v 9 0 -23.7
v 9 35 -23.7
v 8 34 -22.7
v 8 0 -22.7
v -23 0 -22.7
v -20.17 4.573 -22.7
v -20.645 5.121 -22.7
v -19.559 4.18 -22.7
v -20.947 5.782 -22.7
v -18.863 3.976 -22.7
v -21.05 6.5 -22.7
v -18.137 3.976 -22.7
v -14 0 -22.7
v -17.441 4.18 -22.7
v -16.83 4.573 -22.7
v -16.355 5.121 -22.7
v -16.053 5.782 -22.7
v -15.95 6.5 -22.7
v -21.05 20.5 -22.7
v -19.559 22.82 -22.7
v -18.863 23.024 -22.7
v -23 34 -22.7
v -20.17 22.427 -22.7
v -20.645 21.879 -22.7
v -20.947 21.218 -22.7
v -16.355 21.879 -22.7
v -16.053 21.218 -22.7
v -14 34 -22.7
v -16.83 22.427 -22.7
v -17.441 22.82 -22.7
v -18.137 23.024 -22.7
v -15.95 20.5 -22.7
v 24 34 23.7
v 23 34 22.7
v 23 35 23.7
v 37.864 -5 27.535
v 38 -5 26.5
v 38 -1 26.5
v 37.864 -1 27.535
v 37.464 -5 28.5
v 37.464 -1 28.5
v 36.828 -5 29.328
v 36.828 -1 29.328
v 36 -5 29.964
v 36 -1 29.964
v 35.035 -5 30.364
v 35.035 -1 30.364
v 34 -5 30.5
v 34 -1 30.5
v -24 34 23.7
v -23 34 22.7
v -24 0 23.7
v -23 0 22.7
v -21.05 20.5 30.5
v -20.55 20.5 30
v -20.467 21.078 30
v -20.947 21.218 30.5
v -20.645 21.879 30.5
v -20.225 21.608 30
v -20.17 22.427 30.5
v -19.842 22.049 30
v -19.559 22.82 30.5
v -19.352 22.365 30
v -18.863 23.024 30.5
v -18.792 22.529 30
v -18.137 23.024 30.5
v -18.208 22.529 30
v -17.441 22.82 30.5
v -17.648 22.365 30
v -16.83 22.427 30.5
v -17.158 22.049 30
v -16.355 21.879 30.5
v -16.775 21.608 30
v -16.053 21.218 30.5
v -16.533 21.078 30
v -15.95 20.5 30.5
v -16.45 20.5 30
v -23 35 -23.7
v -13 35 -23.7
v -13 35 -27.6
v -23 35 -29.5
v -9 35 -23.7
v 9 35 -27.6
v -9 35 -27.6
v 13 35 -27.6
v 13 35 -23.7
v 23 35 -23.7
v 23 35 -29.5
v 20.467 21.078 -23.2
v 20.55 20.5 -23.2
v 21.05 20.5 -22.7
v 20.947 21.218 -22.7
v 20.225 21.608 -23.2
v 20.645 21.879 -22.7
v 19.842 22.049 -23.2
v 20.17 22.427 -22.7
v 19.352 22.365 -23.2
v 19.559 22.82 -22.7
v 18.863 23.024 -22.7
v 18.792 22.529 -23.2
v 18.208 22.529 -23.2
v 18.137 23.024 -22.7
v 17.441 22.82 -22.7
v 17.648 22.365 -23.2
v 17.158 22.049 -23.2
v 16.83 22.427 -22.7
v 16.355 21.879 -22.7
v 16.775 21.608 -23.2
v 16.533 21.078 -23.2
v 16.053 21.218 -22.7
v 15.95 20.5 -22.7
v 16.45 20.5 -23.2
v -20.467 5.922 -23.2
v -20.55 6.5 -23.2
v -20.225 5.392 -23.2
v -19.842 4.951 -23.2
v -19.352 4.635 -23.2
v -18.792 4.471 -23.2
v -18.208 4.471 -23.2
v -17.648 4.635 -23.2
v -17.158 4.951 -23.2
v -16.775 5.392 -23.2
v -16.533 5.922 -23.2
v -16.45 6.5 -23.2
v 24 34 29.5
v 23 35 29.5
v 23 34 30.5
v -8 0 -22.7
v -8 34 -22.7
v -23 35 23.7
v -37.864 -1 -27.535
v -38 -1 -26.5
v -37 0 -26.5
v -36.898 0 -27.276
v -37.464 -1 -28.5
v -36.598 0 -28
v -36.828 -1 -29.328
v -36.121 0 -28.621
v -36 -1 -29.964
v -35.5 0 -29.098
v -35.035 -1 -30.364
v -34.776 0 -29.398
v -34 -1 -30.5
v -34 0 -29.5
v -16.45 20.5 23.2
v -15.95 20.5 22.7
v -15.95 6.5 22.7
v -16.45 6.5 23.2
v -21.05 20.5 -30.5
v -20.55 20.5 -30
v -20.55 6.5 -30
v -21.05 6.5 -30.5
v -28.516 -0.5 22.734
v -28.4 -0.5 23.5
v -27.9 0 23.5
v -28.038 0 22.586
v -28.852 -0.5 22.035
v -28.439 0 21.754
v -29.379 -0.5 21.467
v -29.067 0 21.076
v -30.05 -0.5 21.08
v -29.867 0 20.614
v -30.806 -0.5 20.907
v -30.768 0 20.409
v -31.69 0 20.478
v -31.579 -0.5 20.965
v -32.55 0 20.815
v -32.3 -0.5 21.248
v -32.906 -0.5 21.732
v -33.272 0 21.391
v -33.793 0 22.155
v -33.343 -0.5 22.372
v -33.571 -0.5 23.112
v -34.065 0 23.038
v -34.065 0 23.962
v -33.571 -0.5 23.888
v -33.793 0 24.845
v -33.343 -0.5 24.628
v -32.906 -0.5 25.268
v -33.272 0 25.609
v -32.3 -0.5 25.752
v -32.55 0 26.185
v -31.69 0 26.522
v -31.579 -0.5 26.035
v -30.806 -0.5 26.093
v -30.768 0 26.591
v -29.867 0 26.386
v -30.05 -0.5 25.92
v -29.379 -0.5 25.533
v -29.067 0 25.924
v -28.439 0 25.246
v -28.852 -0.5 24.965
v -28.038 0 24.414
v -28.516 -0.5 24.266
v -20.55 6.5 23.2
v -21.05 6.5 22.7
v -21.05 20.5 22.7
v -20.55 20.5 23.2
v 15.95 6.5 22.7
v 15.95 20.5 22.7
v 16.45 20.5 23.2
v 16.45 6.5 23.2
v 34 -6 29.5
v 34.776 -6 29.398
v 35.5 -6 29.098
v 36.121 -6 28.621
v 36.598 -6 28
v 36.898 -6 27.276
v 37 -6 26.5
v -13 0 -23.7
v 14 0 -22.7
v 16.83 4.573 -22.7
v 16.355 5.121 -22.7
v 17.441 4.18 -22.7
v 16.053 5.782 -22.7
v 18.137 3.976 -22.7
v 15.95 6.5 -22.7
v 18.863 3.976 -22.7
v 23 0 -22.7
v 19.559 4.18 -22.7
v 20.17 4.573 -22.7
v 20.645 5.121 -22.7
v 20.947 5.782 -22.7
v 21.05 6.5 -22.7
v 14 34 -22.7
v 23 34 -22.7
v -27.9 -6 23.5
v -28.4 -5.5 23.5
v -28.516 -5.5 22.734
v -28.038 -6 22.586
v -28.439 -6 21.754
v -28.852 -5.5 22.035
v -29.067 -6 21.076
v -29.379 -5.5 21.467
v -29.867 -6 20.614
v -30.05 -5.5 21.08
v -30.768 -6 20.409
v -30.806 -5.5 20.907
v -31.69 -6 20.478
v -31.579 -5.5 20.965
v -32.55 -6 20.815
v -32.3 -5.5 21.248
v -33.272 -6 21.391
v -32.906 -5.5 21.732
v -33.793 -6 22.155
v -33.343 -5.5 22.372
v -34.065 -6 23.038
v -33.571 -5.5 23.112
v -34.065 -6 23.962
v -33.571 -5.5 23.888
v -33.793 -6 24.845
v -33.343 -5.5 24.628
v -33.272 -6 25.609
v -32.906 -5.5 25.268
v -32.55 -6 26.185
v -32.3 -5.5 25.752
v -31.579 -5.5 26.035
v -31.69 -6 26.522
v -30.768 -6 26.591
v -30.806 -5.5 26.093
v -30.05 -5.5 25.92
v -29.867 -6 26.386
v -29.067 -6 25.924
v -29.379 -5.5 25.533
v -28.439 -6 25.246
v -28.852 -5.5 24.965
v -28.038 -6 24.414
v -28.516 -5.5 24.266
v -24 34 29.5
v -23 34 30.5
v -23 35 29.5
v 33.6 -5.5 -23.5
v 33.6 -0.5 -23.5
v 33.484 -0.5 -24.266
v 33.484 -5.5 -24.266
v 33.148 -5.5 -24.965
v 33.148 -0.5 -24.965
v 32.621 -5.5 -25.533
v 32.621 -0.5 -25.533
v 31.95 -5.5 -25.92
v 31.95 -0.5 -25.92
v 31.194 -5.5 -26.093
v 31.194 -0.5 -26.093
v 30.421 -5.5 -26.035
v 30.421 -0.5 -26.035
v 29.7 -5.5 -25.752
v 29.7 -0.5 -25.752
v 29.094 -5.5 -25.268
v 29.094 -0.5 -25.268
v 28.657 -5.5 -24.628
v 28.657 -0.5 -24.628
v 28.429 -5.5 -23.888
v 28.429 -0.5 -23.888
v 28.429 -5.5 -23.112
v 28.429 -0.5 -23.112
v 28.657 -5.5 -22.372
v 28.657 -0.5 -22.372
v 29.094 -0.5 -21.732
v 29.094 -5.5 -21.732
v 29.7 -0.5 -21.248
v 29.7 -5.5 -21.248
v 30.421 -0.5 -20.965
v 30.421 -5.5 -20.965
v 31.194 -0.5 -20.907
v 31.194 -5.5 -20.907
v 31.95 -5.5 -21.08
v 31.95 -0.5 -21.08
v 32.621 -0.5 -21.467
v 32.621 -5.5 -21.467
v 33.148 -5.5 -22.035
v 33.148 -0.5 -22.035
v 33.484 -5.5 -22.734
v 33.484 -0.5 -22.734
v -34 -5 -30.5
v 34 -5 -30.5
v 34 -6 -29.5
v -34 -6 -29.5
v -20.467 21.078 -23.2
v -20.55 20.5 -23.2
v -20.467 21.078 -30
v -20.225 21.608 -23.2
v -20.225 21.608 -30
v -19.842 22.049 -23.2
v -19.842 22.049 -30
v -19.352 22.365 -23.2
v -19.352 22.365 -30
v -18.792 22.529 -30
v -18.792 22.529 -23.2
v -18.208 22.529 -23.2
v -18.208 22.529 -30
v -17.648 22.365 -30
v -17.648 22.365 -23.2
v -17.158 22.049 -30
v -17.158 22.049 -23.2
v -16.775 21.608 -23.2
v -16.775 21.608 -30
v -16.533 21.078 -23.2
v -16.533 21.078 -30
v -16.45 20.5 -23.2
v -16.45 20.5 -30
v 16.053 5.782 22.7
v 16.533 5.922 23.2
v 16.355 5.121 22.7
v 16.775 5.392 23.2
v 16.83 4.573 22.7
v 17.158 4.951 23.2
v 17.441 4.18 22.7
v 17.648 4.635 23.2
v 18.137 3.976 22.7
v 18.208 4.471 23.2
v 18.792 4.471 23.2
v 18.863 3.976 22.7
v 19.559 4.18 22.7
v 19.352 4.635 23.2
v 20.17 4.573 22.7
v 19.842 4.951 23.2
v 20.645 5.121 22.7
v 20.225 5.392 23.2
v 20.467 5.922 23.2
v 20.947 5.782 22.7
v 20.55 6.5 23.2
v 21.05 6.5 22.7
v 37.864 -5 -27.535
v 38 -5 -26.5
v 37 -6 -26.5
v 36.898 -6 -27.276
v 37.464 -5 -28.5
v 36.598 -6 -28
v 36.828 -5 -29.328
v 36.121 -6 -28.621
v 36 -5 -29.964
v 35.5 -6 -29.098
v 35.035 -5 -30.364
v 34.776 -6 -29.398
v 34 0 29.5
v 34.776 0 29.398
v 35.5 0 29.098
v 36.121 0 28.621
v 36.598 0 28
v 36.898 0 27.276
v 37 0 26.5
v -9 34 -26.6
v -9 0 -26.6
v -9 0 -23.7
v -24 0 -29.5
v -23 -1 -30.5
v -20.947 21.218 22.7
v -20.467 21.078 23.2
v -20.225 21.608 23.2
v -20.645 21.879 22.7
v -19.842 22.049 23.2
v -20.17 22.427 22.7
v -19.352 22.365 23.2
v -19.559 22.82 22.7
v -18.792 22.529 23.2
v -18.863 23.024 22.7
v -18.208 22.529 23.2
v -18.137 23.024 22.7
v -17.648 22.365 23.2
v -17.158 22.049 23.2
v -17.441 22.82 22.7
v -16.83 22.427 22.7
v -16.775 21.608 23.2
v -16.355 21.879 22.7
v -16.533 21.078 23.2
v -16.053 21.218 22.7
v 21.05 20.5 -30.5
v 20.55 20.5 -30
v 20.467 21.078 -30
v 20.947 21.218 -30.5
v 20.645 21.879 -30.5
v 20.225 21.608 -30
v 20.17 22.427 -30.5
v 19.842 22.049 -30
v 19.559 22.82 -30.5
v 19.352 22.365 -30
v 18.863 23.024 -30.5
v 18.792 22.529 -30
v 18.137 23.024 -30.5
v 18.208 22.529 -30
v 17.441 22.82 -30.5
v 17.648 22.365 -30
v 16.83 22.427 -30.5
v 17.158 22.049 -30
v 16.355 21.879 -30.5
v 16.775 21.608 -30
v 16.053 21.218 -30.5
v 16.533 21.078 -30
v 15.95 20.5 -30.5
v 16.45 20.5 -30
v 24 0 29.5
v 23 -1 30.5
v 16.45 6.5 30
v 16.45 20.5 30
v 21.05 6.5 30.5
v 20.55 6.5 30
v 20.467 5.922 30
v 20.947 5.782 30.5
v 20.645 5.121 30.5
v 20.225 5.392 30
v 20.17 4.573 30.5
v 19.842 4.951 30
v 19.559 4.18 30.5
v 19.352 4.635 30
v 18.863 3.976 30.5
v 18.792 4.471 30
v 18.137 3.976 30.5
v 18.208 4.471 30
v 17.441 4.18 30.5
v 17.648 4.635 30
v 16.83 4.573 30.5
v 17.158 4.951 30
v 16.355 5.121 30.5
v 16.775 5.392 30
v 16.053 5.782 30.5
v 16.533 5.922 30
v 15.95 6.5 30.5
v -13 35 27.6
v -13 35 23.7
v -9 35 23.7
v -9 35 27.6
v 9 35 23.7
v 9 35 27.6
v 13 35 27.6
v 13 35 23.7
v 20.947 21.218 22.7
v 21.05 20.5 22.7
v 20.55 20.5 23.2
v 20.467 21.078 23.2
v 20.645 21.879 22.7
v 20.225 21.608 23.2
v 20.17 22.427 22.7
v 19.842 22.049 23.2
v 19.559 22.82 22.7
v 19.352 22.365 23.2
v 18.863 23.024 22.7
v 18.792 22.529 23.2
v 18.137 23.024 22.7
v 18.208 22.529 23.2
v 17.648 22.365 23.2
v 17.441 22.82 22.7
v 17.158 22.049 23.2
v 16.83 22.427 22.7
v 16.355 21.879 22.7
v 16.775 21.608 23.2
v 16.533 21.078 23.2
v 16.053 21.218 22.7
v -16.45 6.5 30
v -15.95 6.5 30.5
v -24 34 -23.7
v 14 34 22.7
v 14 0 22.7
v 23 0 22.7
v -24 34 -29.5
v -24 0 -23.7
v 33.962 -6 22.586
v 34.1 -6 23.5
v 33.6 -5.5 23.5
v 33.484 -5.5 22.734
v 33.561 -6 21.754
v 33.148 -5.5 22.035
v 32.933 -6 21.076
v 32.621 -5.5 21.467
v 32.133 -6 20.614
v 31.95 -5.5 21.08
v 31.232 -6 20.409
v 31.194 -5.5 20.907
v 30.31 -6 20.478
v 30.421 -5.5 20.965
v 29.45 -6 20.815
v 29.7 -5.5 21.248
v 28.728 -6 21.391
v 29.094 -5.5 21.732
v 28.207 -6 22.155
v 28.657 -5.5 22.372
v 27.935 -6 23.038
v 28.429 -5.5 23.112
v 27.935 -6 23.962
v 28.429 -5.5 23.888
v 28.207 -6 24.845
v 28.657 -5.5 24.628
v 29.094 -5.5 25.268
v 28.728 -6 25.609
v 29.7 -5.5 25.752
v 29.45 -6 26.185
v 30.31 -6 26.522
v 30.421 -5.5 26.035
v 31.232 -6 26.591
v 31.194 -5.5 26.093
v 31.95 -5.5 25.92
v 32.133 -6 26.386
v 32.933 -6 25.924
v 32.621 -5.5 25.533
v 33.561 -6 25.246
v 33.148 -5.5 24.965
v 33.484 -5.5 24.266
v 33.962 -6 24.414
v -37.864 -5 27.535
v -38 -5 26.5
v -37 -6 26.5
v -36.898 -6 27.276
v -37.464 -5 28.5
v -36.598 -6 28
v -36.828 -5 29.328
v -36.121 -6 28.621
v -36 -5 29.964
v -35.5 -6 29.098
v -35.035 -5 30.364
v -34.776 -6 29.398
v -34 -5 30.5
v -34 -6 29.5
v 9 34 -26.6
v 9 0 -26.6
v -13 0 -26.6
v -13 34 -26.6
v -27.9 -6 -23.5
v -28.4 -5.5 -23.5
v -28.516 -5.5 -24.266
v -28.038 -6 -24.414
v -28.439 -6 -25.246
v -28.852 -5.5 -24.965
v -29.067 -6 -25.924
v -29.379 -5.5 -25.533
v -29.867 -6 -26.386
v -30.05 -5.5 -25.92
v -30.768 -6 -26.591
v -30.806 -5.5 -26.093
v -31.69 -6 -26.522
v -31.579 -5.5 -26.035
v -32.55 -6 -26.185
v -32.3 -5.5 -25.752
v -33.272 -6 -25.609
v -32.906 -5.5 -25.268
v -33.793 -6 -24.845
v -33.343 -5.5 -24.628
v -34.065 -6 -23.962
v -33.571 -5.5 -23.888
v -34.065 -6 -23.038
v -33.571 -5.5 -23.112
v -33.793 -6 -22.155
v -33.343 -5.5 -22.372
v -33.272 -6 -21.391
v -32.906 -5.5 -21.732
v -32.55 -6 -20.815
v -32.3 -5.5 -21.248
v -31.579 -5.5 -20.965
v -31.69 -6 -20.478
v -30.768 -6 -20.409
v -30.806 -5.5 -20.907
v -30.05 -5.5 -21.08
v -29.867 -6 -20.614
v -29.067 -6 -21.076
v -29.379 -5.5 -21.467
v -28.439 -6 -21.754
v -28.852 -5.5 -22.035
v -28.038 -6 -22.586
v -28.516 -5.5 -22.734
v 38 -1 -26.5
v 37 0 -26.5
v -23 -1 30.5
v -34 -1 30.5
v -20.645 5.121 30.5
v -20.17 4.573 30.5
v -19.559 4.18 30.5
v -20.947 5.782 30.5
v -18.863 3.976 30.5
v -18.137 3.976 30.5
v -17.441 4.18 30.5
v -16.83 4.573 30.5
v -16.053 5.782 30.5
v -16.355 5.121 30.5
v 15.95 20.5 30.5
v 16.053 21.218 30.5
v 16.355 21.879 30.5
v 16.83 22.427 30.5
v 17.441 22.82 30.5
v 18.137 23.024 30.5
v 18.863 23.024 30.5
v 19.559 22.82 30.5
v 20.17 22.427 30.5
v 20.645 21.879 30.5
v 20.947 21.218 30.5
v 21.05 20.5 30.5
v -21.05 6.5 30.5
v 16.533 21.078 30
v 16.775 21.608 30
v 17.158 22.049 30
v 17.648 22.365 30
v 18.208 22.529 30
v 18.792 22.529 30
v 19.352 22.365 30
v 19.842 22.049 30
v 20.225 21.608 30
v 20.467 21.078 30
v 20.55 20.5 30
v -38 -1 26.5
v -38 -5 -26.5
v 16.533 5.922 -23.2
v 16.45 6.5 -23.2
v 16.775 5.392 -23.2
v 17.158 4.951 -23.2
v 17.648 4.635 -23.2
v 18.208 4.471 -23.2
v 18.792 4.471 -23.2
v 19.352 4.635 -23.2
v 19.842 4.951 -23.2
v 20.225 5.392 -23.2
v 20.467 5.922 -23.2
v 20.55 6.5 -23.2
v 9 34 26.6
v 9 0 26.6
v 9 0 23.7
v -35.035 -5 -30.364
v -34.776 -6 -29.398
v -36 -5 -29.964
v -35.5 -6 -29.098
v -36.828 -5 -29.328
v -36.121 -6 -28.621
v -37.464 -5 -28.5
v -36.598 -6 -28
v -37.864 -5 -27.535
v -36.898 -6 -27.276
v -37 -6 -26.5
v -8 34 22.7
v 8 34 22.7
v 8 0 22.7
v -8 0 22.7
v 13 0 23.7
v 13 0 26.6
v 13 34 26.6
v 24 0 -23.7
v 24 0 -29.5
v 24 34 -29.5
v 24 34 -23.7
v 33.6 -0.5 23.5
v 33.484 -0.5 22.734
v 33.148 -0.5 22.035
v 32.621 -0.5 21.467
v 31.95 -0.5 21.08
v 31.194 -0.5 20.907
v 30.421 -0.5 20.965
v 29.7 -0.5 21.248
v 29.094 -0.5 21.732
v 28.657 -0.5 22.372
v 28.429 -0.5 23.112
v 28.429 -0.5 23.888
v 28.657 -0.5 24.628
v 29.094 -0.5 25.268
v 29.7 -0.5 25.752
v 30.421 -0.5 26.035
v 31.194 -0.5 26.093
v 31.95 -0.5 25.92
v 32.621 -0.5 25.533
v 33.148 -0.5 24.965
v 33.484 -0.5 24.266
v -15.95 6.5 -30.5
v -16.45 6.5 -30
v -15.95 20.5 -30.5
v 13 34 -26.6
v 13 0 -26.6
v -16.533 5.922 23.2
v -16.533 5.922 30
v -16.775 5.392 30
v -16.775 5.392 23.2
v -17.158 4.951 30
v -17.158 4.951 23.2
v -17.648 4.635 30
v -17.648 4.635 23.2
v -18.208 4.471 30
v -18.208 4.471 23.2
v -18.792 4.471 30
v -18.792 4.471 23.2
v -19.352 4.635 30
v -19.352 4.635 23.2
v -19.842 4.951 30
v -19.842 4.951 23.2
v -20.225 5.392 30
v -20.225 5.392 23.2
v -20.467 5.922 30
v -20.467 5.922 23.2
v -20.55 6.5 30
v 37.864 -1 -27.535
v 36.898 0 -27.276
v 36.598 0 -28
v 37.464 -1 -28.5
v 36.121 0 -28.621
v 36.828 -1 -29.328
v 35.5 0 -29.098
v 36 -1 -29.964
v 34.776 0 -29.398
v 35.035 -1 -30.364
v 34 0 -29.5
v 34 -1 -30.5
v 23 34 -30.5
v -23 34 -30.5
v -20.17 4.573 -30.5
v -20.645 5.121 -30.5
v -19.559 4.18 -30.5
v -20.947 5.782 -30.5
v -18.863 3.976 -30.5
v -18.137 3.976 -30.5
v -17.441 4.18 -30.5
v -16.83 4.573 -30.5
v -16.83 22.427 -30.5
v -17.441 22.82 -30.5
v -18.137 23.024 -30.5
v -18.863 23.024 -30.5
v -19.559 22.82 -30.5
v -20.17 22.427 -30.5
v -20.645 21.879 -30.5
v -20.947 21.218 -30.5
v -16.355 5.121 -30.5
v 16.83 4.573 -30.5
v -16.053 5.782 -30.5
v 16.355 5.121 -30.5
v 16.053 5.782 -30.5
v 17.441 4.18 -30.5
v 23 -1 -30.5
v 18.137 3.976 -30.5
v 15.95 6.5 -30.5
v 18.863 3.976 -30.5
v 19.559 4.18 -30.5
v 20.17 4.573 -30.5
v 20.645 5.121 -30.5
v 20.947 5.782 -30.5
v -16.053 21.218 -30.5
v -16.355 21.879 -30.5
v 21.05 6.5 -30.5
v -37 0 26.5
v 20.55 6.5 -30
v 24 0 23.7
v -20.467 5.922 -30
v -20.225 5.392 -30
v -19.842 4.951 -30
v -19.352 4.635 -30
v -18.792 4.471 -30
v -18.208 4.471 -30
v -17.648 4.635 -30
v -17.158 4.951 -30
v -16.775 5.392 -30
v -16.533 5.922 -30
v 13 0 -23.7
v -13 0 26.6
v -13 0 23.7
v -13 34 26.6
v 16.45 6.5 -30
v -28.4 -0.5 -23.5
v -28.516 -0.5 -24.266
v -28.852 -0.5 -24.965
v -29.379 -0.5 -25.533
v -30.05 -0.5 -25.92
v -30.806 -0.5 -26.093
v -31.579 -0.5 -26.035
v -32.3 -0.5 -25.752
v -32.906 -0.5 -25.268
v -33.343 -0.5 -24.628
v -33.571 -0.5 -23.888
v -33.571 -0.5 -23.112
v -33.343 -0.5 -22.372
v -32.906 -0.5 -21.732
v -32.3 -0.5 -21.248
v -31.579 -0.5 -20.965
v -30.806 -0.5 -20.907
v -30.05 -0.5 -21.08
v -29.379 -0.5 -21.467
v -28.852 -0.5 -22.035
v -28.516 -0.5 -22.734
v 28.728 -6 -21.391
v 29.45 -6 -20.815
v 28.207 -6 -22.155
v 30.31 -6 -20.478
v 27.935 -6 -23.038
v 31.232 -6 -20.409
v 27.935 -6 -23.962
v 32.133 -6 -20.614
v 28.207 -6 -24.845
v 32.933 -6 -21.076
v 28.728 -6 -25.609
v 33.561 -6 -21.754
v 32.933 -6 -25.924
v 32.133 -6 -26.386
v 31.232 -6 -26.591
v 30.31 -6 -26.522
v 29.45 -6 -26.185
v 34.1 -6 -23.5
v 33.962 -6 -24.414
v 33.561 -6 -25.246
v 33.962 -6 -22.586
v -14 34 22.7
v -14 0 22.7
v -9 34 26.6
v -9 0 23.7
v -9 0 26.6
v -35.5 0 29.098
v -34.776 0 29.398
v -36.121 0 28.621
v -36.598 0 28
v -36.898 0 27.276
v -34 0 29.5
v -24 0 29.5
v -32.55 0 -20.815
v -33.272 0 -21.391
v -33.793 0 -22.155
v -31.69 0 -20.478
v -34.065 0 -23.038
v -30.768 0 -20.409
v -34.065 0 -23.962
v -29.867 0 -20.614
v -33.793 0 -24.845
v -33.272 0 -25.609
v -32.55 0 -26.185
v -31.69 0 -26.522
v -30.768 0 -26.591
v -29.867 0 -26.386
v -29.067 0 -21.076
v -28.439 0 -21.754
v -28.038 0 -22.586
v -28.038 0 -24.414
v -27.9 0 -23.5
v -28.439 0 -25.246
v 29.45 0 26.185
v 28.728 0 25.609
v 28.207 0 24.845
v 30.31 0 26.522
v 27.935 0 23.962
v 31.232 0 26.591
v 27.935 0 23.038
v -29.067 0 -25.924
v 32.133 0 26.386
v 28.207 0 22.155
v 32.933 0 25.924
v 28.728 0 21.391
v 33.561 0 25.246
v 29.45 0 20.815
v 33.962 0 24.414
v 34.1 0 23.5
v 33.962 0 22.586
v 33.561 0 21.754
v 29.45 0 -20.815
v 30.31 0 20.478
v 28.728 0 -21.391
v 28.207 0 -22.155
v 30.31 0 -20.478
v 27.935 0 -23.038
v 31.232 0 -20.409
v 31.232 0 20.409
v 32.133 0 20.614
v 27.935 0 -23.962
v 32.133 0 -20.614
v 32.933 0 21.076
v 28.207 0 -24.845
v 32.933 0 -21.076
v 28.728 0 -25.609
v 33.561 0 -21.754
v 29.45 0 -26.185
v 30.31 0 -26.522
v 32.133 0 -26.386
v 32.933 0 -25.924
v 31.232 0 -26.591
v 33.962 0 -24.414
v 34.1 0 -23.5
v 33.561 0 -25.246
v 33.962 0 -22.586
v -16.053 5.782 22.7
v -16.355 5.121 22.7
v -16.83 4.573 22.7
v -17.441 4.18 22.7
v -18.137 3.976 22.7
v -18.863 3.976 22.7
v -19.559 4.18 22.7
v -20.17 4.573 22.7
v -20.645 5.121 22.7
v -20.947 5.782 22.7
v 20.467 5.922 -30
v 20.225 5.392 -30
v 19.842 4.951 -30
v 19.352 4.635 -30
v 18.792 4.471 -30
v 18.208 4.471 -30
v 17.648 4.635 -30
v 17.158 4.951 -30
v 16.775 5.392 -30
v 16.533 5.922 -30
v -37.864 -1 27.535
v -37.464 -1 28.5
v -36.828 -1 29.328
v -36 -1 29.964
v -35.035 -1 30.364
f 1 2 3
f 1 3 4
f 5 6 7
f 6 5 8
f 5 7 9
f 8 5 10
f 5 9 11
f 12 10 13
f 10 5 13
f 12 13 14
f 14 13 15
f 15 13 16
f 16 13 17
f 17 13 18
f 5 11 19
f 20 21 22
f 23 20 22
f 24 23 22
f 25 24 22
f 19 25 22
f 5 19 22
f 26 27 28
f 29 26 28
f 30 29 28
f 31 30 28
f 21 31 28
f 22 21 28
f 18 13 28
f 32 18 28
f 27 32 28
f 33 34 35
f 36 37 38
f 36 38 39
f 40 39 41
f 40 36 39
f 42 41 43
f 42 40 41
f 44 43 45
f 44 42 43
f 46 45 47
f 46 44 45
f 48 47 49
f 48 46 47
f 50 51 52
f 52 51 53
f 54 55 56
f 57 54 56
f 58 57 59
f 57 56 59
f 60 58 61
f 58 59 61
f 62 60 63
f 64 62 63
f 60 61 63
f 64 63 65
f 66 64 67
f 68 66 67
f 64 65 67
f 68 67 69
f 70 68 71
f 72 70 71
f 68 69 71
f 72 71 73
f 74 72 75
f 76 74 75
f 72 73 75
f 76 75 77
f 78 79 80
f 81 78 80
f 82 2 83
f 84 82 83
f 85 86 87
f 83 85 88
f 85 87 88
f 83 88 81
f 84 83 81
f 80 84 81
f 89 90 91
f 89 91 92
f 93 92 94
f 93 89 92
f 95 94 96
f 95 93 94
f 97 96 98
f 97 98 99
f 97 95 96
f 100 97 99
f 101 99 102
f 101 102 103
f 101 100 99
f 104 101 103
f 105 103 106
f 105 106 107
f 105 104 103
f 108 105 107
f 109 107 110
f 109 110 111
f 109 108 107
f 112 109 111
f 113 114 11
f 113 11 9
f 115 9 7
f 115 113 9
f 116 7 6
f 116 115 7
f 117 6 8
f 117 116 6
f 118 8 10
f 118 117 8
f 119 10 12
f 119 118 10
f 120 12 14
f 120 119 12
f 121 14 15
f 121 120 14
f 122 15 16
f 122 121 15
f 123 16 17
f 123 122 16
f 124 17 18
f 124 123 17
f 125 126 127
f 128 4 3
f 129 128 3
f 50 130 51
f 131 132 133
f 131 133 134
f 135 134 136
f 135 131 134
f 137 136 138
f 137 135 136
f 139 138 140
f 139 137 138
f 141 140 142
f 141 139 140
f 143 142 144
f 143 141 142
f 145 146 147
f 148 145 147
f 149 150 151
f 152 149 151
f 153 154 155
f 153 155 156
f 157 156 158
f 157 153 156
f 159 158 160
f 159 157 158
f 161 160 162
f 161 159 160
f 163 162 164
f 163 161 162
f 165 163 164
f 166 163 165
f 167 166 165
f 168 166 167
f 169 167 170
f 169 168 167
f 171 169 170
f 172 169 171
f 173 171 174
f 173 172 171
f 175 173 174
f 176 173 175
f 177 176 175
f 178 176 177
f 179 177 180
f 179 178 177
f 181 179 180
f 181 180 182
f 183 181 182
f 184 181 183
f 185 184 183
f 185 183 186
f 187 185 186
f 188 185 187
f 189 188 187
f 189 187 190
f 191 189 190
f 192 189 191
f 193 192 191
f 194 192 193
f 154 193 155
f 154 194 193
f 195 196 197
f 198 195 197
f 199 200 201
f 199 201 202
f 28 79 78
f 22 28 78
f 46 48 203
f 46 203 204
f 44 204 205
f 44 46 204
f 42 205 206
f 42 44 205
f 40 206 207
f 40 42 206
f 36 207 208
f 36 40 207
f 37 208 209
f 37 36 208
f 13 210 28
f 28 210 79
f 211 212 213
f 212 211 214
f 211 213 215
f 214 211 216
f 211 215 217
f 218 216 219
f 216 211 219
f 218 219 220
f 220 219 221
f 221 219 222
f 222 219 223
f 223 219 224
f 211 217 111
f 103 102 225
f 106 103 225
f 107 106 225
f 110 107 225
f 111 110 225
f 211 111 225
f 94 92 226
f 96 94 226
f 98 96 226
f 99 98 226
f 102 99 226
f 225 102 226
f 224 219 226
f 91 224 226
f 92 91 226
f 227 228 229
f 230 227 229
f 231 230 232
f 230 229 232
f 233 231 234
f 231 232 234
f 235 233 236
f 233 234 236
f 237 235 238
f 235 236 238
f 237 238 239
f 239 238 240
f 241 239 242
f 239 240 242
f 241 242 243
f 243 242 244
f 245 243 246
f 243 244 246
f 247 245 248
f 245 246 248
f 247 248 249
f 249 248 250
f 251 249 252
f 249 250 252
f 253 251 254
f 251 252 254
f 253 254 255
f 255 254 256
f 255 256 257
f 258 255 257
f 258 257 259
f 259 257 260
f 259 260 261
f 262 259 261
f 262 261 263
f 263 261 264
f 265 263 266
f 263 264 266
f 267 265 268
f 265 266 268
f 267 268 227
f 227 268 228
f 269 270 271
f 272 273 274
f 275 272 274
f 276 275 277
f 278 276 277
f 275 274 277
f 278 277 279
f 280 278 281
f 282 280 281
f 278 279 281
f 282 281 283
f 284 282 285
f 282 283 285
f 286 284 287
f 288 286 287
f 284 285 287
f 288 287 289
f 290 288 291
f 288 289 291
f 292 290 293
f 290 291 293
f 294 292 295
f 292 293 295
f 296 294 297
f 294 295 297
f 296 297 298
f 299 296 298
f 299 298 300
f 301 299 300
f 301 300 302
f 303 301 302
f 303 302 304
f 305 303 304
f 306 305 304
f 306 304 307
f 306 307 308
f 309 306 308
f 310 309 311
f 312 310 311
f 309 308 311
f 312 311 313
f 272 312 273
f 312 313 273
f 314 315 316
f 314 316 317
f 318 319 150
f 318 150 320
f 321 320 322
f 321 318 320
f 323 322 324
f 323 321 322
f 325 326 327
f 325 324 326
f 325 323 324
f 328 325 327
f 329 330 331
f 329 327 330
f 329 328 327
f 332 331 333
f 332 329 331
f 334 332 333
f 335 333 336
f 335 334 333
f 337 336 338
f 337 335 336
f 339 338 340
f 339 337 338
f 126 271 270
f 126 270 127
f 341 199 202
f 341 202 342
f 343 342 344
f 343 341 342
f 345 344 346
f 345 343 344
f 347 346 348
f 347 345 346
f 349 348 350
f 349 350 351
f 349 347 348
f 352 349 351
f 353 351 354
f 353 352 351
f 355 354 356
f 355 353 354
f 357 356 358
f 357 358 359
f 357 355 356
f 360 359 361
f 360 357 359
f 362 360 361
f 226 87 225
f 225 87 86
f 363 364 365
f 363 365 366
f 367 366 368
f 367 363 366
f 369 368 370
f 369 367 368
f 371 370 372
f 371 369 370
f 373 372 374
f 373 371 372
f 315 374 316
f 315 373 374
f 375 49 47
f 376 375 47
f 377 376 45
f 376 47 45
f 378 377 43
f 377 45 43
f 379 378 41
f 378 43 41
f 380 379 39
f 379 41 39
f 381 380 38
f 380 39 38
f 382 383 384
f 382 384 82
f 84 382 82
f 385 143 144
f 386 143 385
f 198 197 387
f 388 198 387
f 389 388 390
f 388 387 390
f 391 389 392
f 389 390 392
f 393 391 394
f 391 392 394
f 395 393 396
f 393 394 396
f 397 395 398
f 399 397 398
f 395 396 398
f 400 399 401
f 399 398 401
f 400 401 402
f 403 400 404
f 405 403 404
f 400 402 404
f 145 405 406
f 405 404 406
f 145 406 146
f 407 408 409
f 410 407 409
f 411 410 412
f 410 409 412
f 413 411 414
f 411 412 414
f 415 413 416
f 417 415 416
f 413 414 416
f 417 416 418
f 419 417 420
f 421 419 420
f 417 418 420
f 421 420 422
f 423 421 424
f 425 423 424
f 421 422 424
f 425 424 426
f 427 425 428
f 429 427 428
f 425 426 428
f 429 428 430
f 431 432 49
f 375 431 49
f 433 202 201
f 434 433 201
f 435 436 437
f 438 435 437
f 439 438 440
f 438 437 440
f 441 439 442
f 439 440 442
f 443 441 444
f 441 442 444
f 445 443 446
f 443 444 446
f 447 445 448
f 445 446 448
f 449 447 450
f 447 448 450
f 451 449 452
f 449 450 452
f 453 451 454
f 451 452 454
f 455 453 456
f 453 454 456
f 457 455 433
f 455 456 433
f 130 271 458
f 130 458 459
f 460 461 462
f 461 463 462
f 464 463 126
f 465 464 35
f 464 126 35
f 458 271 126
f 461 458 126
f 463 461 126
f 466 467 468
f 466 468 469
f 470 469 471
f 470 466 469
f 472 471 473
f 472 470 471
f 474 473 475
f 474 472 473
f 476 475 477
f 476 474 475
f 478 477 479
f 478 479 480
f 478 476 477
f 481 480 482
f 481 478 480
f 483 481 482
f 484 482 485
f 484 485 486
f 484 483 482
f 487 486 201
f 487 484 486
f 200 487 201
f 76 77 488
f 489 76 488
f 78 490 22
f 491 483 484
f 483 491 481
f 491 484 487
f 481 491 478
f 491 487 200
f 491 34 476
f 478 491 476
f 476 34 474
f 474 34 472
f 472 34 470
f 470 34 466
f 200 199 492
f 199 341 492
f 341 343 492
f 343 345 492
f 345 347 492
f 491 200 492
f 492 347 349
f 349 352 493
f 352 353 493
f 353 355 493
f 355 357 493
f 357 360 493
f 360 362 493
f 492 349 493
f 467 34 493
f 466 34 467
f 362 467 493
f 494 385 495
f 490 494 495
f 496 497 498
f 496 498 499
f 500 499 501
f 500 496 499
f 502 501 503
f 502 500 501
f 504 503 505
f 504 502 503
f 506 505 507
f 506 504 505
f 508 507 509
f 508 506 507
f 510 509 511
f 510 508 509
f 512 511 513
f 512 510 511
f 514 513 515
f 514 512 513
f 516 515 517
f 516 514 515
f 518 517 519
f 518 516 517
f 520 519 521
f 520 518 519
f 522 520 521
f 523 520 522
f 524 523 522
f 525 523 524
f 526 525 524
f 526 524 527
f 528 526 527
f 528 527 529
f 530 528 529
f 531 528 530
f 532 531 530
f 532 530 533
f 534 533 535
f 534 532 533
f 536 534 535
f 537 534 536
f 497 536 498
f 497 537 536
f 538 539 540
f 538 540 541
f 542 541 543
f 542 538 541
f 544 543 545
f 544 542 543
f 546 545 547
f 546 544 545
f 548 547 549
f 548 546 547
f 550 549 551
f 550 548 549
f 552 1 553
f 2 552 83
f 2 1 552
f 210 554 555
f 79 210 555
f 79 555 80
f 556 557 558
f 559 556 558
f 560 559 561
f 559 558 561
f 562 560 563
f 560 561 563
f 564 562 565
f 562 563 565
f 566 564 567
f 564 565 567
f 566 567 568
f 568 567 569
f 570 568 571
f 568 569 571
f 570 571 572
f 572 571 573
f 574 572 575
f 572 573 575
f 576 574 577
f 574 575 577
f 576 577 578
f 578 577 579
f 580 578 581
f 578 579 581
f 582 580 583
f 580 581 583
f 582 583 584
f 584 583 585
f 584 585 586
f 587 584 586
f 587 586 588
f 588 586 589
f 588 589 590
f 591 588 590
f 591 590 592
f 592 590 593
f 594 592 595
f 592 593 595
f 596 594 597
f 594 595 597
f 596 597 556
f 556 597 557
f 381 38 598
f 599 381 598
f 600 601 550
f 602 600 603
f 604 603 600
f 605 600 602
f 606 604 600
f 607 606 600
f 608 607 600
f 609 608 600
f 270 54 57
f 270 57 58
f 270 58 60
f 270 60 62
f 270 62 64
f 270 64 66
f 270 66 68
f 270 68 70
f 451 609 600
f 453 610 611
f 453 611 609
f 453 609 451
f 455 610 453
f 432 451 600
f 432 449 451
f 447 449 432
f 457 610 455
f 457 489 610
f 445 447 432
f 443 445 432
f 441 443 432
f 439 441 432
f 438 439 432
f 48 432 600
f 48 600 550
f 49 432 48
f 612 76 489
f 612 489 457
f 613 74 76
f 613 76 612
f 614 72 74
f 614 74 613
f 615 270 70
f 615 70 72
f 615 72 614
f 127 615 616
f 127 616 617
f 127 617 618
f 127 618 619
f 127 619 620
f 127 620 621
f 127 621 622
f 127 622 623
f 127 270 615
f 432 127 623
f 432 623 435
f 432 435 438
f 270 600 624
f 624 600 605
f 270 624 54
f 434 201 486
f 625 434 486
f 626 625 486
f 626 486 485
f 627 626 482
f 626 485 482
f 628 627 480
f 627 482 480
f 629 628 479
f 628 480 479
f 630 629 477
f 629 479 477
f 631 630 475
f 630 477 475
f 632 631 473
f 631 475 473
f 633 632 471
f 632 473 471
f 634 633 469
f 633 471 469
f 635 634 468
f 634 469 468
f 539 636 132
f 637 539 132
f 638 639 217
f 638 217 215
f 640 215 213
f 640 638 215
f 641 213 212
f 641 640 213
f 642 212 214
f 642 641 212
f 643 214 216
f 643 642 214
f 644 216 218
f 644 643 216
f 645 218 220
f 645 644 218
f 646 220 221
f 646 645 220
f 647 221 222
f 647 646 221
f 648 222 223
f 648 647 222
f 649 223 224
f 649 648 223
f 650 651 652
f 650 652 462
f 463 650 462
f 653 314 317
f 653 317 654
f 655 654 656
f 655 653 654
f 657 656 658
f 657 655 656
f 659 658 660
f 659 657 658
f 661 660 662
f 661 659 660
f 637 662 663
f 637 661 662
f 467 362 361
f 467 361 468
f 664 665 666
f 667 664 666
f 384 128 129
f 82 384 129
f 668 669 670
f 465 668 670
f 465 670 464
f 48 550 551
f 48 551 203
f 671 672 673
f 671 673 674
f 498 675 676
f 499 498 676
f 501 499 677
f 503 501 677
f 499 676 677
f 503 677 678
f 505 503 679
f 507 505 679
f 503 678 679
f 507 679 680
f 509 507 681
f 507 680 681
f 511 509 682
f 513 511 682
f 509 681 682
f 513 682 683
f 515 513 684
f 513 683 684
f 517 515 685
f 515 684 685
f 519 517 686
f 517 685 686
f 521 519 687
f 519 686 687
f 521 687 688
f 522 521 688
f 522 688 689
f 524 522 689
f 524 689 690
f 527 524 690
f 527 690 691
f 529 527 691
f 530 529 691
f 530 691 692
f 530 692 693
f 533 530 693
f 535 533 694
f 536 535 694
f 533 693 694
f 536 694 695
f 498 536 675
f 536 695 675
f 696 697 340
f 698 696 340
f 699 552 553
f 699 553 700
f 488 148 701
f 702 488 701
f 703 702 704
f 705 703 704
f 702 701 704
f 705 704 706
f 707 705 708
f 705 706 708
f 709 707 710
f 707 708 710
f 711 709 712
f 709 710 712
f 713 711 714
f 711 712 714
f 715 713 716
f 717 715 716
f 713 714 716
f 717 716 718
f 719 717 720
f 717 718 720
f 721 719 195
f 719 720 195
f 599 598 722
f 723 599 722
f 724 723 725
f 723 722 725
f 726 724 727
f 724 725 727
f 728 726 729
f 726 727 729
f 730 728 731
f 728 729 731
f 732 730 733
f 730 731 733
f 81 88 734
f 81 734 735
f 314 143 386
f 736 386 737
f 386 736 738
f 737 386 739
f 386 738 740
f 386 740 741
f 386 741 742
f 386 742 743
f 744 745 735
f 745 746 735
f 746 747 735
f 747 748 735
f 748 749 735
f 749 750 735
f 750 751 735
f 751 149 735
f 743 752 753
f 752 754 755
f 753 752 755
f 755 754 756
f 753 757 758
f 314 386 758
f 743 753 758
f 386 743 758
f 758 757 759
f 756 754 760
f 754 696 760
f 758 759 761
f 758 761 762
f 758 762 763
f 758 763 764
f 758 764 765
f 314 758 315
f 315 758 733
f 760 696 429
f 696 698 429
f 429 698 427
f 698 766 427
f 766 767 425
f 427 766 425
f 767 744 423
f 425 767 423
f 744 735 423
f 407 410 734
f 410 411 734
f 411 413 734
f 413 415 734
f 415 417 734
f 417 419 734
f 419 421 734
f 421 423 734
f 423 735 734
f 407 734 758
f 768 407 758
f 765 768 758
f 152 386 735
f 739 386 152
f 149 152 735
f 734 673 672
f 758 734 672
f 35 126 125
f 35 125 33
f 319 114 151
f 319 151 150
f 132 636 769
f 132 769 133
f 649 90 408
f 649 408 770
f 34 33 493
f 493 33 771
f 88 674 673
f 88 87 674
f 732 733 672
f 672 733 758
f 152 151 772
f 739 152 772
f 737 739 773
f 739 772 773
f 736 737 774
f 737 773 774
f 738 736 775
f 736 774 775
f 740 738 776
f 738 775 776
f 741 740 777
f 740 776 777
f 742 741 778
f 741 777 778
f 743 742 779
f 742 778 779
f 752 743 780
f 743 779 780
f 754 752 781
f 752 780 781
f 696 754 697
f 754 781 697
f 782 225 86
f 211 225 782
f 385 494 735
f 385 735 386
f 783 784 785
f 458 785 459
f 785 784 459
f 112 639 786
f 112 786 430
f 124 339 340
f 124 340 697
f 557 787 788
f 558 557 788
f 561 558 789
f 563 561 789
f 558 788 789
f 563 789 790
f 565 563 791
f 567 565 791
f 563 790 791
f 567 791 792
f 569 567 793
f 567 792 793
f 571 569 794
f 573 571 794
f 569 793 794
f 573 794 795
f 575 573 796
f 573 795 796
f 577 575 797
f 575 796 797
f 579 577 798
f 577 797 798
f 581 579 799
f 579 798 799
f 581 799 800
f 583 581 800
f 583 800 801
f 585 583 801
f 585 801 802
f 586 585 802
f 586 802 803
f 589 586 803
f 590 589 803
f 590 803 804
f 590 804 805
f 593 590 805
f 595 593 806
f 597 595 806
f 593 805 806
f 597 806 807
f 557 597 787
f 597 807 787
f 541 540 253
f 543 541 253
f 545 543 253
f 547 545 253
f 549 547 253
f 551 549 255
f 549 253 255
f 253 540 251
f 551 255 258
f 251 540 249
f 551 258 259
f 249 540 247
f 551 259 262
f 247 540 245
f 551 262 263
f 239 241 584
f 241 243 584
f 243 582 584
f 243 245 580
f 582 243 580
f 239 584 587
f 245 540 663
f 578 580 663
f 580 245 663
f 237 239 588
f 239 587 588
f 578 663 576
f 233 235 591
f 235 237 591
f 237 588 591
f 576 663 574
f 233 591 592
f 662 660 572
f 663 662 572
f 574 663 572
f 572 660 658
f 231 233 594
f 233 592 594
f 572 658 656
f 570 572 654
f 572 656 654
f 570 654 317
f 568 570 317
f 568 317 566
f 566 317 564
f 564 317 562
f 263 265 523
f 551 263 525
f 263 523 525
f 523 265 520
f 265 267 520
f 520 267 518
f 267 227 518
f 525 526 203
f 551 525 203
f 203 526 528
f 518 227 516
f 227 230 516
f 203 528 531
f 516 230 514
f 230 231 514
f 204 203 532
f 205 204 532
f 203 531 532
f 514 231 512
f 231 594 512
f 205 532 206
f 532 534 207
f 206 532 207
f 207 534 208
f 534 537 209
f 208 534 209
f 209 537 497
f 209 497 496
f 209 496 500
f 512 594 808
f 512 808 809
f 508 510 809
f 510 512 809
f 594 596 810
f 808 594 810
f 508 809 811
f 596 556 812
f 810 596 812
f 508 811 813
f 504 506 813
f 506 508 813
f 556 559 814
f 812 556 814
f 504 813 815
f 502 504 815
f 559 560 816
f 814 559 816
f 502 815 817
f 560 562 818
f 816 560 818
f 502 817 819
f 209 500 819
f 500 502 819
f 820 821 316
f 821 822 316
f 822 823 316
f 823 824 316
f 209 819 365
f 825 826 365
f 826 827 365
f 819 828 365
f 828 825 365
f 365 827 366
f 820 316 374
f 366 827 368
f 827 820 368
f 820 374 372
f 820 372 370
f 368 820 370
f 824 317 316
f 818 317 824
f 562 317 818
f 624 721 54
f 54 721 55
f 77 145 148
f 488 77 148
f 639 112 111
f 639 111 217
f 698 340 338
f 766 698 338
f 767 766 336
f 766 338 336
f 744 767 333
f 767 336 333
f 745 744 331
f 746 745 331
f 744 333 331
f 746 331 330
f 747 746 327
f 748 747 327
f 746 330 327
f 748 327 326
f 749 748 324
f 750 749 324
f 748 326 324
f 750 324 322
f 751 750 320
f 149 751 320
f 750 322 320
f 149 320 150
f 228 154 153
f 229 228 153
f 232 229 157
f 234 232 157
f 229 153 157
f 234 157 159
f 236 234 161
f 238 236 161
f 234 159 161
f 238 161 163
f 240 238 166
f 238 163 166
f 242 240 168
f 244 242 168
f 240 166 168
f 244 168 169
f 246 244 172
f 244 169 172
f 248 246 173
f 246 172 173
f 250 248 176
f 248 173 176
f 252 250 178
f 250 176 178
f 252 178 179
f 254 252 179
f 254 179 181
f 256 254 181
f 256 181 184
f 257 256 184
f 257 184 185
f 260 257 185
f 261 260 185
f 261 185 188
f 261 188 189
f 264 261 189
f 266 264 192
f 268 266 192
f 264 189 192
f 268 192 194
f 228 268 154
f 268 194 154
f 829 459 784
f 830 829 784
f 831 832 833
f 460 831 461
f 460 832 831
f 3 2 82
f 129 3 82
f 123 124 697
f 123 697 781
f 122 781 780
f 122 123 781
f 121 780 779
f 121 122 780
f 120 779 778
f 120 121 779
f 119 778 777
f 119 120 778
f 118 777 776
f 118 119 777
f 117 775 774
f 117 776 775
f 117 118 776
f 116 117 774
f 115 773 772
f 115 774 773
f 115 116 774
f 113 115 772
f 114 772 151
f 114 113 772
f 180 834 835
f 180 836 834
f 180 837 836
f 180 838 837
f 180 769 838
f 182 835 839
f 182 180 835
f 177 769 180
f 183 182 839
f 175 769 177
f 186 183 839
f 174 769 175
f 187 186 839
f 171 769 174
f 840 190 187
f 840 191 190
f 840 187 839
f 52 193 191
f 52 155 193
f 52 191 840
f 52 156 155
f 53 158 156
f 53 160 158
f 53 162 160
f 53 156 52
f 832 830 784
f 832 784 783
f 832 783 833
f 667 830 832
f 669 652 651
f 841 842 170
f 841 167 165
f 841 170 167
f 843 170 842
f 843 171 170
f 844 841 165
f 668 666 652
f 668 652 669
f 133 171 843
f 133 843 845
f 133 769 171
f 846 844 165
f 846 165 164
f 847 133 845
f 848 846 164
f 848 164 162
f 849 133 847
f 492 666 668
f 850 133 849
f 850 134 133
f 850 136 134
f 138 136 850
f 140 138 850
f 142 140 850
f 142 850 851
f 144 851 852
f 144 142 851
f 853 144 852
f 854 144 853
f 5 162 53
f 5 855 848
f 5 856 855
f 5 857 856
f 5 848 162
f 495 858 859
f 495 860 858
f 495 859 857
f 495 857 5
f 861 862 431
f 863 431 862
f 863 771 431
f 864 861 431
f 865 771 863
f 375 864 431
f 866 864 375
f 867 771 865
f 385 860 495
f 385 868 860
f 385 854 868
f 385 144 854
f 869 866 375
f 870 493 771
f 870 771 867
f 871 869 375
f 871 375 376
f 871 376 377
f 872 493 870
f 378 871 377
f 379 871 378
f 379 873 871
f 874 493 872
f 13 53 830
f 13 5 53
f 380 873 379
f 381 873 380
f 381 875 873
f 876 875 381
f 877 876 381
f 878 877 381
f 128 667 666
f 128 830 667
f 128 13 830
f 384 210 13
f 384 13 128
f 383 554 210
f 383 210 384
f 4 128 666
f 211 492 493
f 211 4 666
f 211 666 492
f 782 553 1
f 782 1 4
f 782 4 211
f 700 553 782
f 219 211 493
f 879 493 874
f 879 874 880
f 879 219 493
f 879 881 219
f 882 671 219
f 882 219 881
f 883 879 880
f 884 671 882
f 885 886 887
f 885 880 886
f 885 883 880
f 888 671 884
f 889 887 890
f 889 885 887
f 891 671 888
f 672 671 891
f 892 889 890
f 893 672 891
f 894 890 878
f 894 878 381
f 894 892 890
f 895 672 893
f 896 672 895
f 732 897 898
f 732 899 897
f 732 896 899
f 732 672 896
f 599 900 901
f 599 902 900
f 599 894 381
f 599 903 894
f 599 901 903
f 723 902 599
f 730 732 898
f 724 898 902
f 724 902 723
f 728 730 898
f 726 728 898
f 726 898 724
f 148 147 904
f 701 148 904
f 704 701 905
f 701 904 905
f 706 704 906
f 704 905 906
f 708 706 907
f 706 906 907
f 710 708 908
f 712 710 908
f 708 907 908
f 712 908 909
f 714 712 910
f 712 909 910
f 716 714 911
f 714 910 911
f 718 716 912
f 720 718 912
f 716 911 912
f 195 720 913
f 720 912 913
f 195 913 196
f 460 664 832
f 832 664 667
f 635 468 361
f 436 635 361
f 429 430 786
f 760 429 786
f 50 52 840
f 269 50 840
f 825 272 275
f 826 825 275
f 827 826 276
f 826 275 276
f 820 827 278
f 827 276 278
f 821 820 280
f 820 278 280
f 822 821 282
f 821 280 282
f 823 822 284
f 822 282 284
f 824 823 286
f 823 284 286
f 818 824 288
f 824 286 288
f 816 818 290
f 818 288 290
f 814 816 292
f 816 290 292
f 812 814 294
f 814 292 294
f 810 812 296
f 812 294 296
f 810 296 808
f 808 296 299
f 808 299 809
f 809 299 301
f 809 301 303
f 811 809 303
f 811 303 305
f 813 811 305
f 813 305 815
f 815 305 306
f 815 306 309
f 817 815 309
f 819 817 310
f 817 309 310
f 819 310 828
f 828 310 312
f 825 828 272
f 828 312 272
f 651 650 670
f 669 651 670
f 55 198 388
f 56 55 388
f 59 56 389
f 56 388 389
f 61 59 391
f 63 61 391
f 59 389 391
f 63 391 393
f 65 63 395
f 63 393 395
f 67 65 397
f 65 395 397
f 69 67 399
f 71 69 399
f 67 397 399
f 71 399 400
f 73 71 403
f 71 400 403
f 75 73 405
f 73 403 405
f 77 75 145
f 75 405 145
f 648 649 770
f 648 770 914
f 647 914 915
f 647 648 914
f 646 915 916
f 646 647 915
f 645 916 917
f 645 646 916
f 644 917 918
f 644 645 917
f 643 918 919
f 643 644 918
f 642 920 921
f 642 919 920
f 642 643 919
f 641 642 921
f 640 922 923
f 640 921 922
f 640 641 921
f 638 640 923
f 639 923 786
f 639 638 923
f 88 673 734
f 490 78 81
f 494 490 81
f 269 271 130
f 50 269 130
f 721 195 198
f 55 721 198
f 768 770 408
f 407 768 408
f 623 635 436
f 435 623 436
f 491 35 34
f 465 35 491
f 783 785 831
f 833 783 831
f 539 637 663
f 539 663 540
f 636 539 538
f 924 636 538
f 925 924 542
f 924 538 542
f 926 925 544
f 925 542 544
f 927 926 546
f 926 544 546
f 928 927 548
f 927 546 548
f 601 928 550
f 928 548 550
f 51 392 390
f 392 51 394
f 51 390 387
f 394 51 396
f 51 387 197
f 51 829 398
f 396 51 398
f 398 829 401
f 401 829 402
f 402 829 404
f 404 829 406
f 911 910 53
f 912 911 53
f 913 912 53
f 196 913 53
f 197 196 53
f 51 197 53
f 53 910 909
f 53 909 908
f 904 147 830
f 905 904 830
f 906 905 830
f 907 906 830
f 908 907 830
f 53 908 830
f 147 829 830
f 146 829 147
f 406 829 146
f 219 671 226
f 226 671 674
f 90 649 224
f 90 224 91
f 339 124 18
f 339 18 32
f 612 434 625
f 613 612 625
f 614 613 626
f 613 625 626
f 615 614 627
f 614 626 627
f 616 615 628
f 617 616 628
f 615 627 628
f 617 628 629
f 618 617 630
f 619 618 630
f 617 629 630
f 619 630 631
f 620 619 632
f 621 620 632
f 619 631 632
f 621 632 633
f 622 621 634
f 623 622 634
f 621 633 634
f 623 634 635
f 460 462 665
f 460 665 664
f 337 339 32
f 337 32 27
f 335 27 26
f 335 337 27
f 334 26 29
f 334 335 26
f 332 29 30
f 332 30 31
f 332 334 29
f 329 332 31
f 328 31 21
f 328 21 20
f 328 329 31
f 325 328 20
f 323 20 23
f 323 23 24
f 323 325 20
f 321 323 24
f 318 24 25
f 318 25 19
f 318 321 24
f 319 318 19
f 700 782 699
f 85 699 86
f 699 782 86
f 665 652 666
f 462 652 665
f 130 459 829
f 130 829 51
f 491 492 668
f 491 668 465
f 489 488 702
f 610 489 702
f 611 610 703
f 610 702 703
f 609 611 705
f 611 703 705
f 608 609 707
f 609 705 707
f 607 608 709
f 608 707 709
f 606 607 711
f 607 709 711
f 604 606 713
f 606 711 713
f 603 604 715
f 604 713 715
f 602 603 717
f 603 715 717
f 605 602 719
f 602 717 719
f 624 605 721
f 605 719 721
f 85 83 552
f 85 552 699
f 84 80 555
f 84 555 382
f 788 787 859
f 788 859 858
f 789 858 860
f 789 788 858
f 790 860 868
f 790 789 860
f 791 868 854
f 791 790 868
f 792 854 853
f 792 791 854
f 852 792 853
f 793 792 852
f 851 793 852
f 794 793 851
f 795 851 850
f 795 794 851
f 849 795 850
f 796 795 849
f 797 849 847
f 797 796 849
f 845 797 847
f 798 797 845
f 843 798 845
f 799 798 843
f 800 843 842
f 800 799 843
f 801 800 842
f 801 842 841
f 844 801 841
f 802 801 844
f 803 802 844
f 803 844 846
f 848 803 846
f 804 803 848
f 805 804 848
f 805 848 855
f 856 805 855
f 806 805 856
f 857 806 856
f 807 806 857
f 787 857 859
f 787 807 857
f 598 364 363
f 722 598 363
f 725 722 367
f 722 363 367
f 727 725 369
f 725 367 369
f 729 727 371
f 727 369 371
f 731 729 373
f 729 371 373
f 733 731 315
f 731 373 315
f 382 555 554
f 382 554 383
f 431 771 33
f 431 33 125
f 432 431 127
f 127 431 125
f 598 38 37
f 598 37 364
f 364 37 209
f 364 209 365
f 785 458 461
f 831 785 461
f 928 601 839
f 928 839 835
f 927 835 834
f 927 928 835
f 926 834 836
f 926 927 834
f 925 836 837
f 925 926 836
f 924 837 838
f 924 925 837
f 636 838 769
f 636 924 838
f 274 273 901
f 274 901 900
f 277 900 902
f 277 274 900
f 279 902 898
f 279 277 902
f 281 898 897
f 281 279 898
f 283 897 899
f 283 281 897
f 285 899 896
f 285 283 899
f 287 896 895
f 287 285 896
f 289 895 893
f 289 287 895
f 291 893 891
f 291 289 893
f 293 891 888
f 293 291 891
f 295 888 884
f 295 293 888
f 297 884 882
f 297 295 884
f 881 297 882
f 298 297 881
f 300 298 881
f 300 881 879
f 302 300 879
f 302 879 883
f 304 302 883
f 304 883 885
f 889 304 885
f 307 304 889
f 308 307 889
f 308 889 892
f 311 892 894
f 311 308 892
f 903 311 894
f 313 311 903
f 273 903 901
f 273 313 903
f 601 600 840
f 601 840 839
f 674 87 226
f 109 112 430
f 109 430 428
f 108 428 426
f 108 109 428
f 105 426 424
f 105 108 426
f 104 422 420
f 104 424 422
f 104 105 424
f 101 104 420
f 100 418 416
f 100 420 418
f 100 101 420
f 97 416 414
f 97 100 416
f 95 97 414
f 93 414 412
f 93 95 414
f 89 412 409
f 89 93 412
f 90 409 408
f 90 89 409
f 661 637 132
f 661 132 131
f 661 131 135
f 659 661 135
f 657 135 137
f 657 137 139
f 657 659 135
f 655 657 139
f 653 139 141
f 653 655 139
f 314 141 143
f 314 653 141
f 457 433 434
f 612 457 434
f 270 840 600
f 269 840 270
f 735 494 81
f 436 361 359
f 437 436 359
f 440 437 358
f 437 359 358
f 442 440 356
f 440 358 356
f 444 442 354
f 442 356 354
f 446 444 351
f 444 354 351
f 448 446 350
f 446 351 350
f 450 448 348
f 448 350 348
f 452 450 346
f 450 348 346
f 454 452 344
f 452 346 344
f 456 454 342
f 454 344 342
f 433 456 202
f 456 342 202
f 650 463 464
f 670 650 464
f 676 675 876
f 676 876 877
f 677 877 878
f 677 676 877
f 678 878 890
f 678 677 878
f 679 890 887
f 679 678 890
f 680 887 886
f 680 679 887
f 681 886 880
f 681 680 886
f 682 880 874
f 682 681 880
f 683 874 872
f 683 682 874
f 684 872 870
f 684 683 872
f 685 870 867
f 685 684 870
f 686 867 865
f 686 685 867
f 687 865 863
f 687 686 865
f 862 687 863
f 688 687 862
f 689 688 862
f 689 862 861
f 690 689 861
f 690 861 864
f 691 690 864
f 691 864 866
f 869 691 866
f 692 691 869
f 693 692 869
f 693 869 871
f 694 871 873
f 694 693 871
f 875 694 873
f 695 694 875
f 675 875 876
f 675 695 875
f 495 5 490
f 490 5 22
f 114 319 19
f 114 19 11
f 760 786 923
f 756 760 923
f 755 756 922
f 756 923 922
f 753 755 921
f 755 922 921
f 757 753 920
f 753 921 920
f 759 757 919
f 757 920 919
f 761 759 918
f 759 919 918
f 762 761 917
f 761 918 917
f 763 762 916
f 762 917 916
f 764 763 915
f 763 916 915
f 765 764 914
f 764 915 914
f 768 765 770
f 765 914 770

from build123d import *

# Parameters (mm, degrees)
BOSS_EXTRUDE1_DEPTH     = 24
SKETCH3_W               = 4
SKETCH3_H               = 35
CUT_EXTRUDE1_DEPTH      = 26.6
CUT_EXTRUDE2_DEPTH      = 31.5
CUT_EXTRUDE2_DEPTH_BACK = 31.5
SKETCH5_W               = 14
SKETCH5_H               = 61
SKETCH5_R               = 2.6
BOSS_EXTRUDE2_DEPTH     = 6
FILLET1_R               = 4
CHAMFER1_SIZE           = 1
CHAMFER2_SIZE           = 0.5


with BuildPart() as part:
    # Sketch2 → Boss-Extrude1 (new body, symmetric)
    with BuildSketch(Plane(origin=(0, 0, 0), x_dir=(0, 0, -1), z_dir=(1, 0, 0))):
        Polygon((-30.5, 35), (-22.7, 35), (-22.7, 0), (0, 0), (22.7, 0), (22.7, 35), (30.5, 35), (30.5, -6), (-30.5, -6), align=None)
    extrude(amount=BOSS_EXTRUDE1_DEPTH, both=True)

    # Sketch3 → Cut-Extrude1 (cut, symmetric)
    with BuildSketch(Plane.XY):
        with Locations((-11, 17.5)):
            Rectangle(SKETCH3_W, SKETCH3_H)
        with Locations((11, 17.5)):
            Rectangle(SKETCH3_W, SKETCH3_H)
    extrude(amount=CUT_EXTRUDE1_DEPTH, both=True, mode=Mode.SUBTRACT)

    # Sketch4 → Cut-Extrude2 (cut, two sides)
    with BuildSketch(Plane.XY) as cut_extrude2_sk:
        with BuildLine():
            Line((-16.45, 20.5), (-16.45, 6.5))
            ThreePointArc((-16.45, 6.5), (-18.5, 4.45), (-20.55, 6.5))
            Line((-20.55, 6.5), (-20.55, 20.5))
            ThreePointArc((-20.55, 20.5), (-18.5, 22.55), (-16.45, 20.5))
        make_face()
        with BuildLine():
            Line((20.55, 20.5), (20.55, 6.5))
            ThreePointArc((20.55, 6.5), (18.5, 4.45), (16.45, 6.5))
            Line((16.45, 6.5), (16.45, 20.5))
            ThreePointArc((16.45, 20.5), (18.5, 22.55), (20.55, 20.5))
        make_face()
    extrude(amount=CUT_EXTRUDE2_DEPTH, mode=Mode.SUBTRACT)
    extrude(cut_extrude2_sk.sketch, amount=-CUT_EXTRUDE2_DEPTH_BACK, mode=Mode.SUBTRACT)

    # Sketch5 → Boss-Extrude2 (add)
    with BuildSketch(Plane(origin=(0, 0, 0), x_dir=(1, 0, 0), z_dir=(0, 1, 0))):
        with Locations((-31, 0)):
            Rectangle(SKETCH5_W, SKETCH5_H)
        with Locations((-31, 23.5)):
            Circle(SKETCH5_R, mode=Mode.SUBTRACT)
        with Locations((-31, -23.5)):
            Circle(SKETCH5_R, mode=Mode.SUBTRACT)
        with Locations((31, 0)):
            Rectangle(SKETCH5_W, SKETCH5_H)
        with Locations((31, 23.5)):
            Circle(SKETCH5_R, mode=Mode.SUBTRACT)
        with Locations((31, -23.5)):
            Circle(SKETCH5_R, mode=Mode.SUBTRACT)
    extrude(amount=-BOSS_EXTRUDE2_DEPTH)

    # Fillet1
    fillet1_edges = [part.edges().sort_by_distance(p)[0] for p in [
        (-38, -3, -30.5),
        (-38, -3, 30.5),
        (38, -3, 30.5),
        (38, -3, -30.5),
    ]]
    fillet(fillet1_edges, radius=FILLET1_R)

    # Chamfer1
    chamfer1_edges = [part.edges().sort_by_distance(p)[0] for p in [
        (-24, 17.5, -22.7),
        (-24, 35, -26.6),
        (-24, 17.5, 30.5),
        (24, 35, -26.6),
        (-24, 17.5, -30.5),
        (-29, 0, -30.5),
        (0, 35, 30.5),
        (18.5, 35, 22.7),
        (24, 17.5, -30.5),
        (18.5, 35, -22.7),
        (29, 0, 30.5),
        (0, 35, -30.5),
        (24, 17.5, -22.7),
        (0, -6, -30.5),
        (29, 0, -30.5),
        (-38, 0, 0),
        (-29, 0, 30.5),
        (38, 0, 0),
        (36.828427125, 0, 29.328427125),
        (36.828427125, 0, -29.328427125),
        (-36.828427125, 0, 29.328427125),
        (-36.828427125, 0, -29.328427125),
        (-38, -6, 0),
        (0, -6, 30.5),
        (38, -6, 0),
        (36.828427125, -6, 29.328427125),
        (36.828427125, -6, -29.328427125),
        (-36.828427125, -6, 29.328427125),
        (-36.828427125, -6, -29.328427125),
        (24, 17.5, 22.7),
        (0, 35, 22.7),
        (24, 35, 26.6),
        (-18.5, 35, 22.7),
        (0, 35, -22.7),
        (-18.5, 35, -22.7),
        (24, 17.5, 30.5),
        (-11, 35, -26.6),
        (-13, 17.5, -22.7),
        (-13, 17.5, 22.7),
        (-9, 17.5, -22.7),
        (-9, 17.5, 22.7),
        (-11, 35, 26.6),
        (11, 35, -26.6),
        (9, 17.5, -22.7),
        (9, 17.5, 22.7),
        (13, 17.5, -22.7),
        (13, 17.5, 22.7),
        (11, 35, 26.6),
        (-24, 35, 26.6),
        (-24, 17.5, 22.7),
    ]]
    chamfer(chamfer1_edges, length=CHAMFER1_SIZE)

    # Chamfer2
    chamfer2_edges = [part.edges().sort_by_distance(p)[0] for p in [
        (-18.5, 22.55, 30.5),
        (-20.55, 13.5, 30.5),
        (-18.5, 4.45, 30.5),
        (-16.45, 13.5, 30.5),
        (18.5, 22.55, -22.7),
        (18.5, 22.55, -30.5),
        (20.55, 13.5, -22.7),
        (20.55, 13.5, -30.5),
        (18.5, 4.45, -22.7),
        (18.5, 4.45, -30.5),
        (16.45, 13.5, -22.7),
        (16.45, 13.5, -30.5),
        (18.5, 22.55, 30.5),
        (16.45, 13.5, 30.5),
        (18.5, 4.45, 30.5),
        (20.55, 13.5, 30.5),
        (-33.6, -6, -23.5),
        (-33.6, 0, -23.5),
        (-33.6, -6, 23.5),
        (-33.6, 0, 23.5),
        (28.4, -6, -23.5),
        (28.4, 0, -23.5),
        (28.4, -6, 23.5),
        (28.4, 0, 23.5),
        (16.45, 13.5, 22.7),
        (18.5, 4.45, 22.7),
        (20.55, 13.5, 22.7),
        (18.5, 22.55, 22.7),
        (-18.5, 22.55, -22.7),
        (-18.5, 22.55, -30.5),
        (-18.5, 22.55, 22.7),
        (-16.45, 13.5, -22.7),
        (-16.45, 13.5, -30.5),
        (-16.45, 13.5, 22.7),
        (-18.5, 4.45, -22.7),
        (-18.5, 4.45, -30.5),
        (-18.5, 4.45, 22.7),
        (-20.55, 13.5, -22.7),
        (-20.55, 13.5, -30.5),
        (-20.55, 13.5, 22.7),
    ]]
    chamfer(chamfer2_edges, length=CHAMFER2_SIZE)


solid = part.part
